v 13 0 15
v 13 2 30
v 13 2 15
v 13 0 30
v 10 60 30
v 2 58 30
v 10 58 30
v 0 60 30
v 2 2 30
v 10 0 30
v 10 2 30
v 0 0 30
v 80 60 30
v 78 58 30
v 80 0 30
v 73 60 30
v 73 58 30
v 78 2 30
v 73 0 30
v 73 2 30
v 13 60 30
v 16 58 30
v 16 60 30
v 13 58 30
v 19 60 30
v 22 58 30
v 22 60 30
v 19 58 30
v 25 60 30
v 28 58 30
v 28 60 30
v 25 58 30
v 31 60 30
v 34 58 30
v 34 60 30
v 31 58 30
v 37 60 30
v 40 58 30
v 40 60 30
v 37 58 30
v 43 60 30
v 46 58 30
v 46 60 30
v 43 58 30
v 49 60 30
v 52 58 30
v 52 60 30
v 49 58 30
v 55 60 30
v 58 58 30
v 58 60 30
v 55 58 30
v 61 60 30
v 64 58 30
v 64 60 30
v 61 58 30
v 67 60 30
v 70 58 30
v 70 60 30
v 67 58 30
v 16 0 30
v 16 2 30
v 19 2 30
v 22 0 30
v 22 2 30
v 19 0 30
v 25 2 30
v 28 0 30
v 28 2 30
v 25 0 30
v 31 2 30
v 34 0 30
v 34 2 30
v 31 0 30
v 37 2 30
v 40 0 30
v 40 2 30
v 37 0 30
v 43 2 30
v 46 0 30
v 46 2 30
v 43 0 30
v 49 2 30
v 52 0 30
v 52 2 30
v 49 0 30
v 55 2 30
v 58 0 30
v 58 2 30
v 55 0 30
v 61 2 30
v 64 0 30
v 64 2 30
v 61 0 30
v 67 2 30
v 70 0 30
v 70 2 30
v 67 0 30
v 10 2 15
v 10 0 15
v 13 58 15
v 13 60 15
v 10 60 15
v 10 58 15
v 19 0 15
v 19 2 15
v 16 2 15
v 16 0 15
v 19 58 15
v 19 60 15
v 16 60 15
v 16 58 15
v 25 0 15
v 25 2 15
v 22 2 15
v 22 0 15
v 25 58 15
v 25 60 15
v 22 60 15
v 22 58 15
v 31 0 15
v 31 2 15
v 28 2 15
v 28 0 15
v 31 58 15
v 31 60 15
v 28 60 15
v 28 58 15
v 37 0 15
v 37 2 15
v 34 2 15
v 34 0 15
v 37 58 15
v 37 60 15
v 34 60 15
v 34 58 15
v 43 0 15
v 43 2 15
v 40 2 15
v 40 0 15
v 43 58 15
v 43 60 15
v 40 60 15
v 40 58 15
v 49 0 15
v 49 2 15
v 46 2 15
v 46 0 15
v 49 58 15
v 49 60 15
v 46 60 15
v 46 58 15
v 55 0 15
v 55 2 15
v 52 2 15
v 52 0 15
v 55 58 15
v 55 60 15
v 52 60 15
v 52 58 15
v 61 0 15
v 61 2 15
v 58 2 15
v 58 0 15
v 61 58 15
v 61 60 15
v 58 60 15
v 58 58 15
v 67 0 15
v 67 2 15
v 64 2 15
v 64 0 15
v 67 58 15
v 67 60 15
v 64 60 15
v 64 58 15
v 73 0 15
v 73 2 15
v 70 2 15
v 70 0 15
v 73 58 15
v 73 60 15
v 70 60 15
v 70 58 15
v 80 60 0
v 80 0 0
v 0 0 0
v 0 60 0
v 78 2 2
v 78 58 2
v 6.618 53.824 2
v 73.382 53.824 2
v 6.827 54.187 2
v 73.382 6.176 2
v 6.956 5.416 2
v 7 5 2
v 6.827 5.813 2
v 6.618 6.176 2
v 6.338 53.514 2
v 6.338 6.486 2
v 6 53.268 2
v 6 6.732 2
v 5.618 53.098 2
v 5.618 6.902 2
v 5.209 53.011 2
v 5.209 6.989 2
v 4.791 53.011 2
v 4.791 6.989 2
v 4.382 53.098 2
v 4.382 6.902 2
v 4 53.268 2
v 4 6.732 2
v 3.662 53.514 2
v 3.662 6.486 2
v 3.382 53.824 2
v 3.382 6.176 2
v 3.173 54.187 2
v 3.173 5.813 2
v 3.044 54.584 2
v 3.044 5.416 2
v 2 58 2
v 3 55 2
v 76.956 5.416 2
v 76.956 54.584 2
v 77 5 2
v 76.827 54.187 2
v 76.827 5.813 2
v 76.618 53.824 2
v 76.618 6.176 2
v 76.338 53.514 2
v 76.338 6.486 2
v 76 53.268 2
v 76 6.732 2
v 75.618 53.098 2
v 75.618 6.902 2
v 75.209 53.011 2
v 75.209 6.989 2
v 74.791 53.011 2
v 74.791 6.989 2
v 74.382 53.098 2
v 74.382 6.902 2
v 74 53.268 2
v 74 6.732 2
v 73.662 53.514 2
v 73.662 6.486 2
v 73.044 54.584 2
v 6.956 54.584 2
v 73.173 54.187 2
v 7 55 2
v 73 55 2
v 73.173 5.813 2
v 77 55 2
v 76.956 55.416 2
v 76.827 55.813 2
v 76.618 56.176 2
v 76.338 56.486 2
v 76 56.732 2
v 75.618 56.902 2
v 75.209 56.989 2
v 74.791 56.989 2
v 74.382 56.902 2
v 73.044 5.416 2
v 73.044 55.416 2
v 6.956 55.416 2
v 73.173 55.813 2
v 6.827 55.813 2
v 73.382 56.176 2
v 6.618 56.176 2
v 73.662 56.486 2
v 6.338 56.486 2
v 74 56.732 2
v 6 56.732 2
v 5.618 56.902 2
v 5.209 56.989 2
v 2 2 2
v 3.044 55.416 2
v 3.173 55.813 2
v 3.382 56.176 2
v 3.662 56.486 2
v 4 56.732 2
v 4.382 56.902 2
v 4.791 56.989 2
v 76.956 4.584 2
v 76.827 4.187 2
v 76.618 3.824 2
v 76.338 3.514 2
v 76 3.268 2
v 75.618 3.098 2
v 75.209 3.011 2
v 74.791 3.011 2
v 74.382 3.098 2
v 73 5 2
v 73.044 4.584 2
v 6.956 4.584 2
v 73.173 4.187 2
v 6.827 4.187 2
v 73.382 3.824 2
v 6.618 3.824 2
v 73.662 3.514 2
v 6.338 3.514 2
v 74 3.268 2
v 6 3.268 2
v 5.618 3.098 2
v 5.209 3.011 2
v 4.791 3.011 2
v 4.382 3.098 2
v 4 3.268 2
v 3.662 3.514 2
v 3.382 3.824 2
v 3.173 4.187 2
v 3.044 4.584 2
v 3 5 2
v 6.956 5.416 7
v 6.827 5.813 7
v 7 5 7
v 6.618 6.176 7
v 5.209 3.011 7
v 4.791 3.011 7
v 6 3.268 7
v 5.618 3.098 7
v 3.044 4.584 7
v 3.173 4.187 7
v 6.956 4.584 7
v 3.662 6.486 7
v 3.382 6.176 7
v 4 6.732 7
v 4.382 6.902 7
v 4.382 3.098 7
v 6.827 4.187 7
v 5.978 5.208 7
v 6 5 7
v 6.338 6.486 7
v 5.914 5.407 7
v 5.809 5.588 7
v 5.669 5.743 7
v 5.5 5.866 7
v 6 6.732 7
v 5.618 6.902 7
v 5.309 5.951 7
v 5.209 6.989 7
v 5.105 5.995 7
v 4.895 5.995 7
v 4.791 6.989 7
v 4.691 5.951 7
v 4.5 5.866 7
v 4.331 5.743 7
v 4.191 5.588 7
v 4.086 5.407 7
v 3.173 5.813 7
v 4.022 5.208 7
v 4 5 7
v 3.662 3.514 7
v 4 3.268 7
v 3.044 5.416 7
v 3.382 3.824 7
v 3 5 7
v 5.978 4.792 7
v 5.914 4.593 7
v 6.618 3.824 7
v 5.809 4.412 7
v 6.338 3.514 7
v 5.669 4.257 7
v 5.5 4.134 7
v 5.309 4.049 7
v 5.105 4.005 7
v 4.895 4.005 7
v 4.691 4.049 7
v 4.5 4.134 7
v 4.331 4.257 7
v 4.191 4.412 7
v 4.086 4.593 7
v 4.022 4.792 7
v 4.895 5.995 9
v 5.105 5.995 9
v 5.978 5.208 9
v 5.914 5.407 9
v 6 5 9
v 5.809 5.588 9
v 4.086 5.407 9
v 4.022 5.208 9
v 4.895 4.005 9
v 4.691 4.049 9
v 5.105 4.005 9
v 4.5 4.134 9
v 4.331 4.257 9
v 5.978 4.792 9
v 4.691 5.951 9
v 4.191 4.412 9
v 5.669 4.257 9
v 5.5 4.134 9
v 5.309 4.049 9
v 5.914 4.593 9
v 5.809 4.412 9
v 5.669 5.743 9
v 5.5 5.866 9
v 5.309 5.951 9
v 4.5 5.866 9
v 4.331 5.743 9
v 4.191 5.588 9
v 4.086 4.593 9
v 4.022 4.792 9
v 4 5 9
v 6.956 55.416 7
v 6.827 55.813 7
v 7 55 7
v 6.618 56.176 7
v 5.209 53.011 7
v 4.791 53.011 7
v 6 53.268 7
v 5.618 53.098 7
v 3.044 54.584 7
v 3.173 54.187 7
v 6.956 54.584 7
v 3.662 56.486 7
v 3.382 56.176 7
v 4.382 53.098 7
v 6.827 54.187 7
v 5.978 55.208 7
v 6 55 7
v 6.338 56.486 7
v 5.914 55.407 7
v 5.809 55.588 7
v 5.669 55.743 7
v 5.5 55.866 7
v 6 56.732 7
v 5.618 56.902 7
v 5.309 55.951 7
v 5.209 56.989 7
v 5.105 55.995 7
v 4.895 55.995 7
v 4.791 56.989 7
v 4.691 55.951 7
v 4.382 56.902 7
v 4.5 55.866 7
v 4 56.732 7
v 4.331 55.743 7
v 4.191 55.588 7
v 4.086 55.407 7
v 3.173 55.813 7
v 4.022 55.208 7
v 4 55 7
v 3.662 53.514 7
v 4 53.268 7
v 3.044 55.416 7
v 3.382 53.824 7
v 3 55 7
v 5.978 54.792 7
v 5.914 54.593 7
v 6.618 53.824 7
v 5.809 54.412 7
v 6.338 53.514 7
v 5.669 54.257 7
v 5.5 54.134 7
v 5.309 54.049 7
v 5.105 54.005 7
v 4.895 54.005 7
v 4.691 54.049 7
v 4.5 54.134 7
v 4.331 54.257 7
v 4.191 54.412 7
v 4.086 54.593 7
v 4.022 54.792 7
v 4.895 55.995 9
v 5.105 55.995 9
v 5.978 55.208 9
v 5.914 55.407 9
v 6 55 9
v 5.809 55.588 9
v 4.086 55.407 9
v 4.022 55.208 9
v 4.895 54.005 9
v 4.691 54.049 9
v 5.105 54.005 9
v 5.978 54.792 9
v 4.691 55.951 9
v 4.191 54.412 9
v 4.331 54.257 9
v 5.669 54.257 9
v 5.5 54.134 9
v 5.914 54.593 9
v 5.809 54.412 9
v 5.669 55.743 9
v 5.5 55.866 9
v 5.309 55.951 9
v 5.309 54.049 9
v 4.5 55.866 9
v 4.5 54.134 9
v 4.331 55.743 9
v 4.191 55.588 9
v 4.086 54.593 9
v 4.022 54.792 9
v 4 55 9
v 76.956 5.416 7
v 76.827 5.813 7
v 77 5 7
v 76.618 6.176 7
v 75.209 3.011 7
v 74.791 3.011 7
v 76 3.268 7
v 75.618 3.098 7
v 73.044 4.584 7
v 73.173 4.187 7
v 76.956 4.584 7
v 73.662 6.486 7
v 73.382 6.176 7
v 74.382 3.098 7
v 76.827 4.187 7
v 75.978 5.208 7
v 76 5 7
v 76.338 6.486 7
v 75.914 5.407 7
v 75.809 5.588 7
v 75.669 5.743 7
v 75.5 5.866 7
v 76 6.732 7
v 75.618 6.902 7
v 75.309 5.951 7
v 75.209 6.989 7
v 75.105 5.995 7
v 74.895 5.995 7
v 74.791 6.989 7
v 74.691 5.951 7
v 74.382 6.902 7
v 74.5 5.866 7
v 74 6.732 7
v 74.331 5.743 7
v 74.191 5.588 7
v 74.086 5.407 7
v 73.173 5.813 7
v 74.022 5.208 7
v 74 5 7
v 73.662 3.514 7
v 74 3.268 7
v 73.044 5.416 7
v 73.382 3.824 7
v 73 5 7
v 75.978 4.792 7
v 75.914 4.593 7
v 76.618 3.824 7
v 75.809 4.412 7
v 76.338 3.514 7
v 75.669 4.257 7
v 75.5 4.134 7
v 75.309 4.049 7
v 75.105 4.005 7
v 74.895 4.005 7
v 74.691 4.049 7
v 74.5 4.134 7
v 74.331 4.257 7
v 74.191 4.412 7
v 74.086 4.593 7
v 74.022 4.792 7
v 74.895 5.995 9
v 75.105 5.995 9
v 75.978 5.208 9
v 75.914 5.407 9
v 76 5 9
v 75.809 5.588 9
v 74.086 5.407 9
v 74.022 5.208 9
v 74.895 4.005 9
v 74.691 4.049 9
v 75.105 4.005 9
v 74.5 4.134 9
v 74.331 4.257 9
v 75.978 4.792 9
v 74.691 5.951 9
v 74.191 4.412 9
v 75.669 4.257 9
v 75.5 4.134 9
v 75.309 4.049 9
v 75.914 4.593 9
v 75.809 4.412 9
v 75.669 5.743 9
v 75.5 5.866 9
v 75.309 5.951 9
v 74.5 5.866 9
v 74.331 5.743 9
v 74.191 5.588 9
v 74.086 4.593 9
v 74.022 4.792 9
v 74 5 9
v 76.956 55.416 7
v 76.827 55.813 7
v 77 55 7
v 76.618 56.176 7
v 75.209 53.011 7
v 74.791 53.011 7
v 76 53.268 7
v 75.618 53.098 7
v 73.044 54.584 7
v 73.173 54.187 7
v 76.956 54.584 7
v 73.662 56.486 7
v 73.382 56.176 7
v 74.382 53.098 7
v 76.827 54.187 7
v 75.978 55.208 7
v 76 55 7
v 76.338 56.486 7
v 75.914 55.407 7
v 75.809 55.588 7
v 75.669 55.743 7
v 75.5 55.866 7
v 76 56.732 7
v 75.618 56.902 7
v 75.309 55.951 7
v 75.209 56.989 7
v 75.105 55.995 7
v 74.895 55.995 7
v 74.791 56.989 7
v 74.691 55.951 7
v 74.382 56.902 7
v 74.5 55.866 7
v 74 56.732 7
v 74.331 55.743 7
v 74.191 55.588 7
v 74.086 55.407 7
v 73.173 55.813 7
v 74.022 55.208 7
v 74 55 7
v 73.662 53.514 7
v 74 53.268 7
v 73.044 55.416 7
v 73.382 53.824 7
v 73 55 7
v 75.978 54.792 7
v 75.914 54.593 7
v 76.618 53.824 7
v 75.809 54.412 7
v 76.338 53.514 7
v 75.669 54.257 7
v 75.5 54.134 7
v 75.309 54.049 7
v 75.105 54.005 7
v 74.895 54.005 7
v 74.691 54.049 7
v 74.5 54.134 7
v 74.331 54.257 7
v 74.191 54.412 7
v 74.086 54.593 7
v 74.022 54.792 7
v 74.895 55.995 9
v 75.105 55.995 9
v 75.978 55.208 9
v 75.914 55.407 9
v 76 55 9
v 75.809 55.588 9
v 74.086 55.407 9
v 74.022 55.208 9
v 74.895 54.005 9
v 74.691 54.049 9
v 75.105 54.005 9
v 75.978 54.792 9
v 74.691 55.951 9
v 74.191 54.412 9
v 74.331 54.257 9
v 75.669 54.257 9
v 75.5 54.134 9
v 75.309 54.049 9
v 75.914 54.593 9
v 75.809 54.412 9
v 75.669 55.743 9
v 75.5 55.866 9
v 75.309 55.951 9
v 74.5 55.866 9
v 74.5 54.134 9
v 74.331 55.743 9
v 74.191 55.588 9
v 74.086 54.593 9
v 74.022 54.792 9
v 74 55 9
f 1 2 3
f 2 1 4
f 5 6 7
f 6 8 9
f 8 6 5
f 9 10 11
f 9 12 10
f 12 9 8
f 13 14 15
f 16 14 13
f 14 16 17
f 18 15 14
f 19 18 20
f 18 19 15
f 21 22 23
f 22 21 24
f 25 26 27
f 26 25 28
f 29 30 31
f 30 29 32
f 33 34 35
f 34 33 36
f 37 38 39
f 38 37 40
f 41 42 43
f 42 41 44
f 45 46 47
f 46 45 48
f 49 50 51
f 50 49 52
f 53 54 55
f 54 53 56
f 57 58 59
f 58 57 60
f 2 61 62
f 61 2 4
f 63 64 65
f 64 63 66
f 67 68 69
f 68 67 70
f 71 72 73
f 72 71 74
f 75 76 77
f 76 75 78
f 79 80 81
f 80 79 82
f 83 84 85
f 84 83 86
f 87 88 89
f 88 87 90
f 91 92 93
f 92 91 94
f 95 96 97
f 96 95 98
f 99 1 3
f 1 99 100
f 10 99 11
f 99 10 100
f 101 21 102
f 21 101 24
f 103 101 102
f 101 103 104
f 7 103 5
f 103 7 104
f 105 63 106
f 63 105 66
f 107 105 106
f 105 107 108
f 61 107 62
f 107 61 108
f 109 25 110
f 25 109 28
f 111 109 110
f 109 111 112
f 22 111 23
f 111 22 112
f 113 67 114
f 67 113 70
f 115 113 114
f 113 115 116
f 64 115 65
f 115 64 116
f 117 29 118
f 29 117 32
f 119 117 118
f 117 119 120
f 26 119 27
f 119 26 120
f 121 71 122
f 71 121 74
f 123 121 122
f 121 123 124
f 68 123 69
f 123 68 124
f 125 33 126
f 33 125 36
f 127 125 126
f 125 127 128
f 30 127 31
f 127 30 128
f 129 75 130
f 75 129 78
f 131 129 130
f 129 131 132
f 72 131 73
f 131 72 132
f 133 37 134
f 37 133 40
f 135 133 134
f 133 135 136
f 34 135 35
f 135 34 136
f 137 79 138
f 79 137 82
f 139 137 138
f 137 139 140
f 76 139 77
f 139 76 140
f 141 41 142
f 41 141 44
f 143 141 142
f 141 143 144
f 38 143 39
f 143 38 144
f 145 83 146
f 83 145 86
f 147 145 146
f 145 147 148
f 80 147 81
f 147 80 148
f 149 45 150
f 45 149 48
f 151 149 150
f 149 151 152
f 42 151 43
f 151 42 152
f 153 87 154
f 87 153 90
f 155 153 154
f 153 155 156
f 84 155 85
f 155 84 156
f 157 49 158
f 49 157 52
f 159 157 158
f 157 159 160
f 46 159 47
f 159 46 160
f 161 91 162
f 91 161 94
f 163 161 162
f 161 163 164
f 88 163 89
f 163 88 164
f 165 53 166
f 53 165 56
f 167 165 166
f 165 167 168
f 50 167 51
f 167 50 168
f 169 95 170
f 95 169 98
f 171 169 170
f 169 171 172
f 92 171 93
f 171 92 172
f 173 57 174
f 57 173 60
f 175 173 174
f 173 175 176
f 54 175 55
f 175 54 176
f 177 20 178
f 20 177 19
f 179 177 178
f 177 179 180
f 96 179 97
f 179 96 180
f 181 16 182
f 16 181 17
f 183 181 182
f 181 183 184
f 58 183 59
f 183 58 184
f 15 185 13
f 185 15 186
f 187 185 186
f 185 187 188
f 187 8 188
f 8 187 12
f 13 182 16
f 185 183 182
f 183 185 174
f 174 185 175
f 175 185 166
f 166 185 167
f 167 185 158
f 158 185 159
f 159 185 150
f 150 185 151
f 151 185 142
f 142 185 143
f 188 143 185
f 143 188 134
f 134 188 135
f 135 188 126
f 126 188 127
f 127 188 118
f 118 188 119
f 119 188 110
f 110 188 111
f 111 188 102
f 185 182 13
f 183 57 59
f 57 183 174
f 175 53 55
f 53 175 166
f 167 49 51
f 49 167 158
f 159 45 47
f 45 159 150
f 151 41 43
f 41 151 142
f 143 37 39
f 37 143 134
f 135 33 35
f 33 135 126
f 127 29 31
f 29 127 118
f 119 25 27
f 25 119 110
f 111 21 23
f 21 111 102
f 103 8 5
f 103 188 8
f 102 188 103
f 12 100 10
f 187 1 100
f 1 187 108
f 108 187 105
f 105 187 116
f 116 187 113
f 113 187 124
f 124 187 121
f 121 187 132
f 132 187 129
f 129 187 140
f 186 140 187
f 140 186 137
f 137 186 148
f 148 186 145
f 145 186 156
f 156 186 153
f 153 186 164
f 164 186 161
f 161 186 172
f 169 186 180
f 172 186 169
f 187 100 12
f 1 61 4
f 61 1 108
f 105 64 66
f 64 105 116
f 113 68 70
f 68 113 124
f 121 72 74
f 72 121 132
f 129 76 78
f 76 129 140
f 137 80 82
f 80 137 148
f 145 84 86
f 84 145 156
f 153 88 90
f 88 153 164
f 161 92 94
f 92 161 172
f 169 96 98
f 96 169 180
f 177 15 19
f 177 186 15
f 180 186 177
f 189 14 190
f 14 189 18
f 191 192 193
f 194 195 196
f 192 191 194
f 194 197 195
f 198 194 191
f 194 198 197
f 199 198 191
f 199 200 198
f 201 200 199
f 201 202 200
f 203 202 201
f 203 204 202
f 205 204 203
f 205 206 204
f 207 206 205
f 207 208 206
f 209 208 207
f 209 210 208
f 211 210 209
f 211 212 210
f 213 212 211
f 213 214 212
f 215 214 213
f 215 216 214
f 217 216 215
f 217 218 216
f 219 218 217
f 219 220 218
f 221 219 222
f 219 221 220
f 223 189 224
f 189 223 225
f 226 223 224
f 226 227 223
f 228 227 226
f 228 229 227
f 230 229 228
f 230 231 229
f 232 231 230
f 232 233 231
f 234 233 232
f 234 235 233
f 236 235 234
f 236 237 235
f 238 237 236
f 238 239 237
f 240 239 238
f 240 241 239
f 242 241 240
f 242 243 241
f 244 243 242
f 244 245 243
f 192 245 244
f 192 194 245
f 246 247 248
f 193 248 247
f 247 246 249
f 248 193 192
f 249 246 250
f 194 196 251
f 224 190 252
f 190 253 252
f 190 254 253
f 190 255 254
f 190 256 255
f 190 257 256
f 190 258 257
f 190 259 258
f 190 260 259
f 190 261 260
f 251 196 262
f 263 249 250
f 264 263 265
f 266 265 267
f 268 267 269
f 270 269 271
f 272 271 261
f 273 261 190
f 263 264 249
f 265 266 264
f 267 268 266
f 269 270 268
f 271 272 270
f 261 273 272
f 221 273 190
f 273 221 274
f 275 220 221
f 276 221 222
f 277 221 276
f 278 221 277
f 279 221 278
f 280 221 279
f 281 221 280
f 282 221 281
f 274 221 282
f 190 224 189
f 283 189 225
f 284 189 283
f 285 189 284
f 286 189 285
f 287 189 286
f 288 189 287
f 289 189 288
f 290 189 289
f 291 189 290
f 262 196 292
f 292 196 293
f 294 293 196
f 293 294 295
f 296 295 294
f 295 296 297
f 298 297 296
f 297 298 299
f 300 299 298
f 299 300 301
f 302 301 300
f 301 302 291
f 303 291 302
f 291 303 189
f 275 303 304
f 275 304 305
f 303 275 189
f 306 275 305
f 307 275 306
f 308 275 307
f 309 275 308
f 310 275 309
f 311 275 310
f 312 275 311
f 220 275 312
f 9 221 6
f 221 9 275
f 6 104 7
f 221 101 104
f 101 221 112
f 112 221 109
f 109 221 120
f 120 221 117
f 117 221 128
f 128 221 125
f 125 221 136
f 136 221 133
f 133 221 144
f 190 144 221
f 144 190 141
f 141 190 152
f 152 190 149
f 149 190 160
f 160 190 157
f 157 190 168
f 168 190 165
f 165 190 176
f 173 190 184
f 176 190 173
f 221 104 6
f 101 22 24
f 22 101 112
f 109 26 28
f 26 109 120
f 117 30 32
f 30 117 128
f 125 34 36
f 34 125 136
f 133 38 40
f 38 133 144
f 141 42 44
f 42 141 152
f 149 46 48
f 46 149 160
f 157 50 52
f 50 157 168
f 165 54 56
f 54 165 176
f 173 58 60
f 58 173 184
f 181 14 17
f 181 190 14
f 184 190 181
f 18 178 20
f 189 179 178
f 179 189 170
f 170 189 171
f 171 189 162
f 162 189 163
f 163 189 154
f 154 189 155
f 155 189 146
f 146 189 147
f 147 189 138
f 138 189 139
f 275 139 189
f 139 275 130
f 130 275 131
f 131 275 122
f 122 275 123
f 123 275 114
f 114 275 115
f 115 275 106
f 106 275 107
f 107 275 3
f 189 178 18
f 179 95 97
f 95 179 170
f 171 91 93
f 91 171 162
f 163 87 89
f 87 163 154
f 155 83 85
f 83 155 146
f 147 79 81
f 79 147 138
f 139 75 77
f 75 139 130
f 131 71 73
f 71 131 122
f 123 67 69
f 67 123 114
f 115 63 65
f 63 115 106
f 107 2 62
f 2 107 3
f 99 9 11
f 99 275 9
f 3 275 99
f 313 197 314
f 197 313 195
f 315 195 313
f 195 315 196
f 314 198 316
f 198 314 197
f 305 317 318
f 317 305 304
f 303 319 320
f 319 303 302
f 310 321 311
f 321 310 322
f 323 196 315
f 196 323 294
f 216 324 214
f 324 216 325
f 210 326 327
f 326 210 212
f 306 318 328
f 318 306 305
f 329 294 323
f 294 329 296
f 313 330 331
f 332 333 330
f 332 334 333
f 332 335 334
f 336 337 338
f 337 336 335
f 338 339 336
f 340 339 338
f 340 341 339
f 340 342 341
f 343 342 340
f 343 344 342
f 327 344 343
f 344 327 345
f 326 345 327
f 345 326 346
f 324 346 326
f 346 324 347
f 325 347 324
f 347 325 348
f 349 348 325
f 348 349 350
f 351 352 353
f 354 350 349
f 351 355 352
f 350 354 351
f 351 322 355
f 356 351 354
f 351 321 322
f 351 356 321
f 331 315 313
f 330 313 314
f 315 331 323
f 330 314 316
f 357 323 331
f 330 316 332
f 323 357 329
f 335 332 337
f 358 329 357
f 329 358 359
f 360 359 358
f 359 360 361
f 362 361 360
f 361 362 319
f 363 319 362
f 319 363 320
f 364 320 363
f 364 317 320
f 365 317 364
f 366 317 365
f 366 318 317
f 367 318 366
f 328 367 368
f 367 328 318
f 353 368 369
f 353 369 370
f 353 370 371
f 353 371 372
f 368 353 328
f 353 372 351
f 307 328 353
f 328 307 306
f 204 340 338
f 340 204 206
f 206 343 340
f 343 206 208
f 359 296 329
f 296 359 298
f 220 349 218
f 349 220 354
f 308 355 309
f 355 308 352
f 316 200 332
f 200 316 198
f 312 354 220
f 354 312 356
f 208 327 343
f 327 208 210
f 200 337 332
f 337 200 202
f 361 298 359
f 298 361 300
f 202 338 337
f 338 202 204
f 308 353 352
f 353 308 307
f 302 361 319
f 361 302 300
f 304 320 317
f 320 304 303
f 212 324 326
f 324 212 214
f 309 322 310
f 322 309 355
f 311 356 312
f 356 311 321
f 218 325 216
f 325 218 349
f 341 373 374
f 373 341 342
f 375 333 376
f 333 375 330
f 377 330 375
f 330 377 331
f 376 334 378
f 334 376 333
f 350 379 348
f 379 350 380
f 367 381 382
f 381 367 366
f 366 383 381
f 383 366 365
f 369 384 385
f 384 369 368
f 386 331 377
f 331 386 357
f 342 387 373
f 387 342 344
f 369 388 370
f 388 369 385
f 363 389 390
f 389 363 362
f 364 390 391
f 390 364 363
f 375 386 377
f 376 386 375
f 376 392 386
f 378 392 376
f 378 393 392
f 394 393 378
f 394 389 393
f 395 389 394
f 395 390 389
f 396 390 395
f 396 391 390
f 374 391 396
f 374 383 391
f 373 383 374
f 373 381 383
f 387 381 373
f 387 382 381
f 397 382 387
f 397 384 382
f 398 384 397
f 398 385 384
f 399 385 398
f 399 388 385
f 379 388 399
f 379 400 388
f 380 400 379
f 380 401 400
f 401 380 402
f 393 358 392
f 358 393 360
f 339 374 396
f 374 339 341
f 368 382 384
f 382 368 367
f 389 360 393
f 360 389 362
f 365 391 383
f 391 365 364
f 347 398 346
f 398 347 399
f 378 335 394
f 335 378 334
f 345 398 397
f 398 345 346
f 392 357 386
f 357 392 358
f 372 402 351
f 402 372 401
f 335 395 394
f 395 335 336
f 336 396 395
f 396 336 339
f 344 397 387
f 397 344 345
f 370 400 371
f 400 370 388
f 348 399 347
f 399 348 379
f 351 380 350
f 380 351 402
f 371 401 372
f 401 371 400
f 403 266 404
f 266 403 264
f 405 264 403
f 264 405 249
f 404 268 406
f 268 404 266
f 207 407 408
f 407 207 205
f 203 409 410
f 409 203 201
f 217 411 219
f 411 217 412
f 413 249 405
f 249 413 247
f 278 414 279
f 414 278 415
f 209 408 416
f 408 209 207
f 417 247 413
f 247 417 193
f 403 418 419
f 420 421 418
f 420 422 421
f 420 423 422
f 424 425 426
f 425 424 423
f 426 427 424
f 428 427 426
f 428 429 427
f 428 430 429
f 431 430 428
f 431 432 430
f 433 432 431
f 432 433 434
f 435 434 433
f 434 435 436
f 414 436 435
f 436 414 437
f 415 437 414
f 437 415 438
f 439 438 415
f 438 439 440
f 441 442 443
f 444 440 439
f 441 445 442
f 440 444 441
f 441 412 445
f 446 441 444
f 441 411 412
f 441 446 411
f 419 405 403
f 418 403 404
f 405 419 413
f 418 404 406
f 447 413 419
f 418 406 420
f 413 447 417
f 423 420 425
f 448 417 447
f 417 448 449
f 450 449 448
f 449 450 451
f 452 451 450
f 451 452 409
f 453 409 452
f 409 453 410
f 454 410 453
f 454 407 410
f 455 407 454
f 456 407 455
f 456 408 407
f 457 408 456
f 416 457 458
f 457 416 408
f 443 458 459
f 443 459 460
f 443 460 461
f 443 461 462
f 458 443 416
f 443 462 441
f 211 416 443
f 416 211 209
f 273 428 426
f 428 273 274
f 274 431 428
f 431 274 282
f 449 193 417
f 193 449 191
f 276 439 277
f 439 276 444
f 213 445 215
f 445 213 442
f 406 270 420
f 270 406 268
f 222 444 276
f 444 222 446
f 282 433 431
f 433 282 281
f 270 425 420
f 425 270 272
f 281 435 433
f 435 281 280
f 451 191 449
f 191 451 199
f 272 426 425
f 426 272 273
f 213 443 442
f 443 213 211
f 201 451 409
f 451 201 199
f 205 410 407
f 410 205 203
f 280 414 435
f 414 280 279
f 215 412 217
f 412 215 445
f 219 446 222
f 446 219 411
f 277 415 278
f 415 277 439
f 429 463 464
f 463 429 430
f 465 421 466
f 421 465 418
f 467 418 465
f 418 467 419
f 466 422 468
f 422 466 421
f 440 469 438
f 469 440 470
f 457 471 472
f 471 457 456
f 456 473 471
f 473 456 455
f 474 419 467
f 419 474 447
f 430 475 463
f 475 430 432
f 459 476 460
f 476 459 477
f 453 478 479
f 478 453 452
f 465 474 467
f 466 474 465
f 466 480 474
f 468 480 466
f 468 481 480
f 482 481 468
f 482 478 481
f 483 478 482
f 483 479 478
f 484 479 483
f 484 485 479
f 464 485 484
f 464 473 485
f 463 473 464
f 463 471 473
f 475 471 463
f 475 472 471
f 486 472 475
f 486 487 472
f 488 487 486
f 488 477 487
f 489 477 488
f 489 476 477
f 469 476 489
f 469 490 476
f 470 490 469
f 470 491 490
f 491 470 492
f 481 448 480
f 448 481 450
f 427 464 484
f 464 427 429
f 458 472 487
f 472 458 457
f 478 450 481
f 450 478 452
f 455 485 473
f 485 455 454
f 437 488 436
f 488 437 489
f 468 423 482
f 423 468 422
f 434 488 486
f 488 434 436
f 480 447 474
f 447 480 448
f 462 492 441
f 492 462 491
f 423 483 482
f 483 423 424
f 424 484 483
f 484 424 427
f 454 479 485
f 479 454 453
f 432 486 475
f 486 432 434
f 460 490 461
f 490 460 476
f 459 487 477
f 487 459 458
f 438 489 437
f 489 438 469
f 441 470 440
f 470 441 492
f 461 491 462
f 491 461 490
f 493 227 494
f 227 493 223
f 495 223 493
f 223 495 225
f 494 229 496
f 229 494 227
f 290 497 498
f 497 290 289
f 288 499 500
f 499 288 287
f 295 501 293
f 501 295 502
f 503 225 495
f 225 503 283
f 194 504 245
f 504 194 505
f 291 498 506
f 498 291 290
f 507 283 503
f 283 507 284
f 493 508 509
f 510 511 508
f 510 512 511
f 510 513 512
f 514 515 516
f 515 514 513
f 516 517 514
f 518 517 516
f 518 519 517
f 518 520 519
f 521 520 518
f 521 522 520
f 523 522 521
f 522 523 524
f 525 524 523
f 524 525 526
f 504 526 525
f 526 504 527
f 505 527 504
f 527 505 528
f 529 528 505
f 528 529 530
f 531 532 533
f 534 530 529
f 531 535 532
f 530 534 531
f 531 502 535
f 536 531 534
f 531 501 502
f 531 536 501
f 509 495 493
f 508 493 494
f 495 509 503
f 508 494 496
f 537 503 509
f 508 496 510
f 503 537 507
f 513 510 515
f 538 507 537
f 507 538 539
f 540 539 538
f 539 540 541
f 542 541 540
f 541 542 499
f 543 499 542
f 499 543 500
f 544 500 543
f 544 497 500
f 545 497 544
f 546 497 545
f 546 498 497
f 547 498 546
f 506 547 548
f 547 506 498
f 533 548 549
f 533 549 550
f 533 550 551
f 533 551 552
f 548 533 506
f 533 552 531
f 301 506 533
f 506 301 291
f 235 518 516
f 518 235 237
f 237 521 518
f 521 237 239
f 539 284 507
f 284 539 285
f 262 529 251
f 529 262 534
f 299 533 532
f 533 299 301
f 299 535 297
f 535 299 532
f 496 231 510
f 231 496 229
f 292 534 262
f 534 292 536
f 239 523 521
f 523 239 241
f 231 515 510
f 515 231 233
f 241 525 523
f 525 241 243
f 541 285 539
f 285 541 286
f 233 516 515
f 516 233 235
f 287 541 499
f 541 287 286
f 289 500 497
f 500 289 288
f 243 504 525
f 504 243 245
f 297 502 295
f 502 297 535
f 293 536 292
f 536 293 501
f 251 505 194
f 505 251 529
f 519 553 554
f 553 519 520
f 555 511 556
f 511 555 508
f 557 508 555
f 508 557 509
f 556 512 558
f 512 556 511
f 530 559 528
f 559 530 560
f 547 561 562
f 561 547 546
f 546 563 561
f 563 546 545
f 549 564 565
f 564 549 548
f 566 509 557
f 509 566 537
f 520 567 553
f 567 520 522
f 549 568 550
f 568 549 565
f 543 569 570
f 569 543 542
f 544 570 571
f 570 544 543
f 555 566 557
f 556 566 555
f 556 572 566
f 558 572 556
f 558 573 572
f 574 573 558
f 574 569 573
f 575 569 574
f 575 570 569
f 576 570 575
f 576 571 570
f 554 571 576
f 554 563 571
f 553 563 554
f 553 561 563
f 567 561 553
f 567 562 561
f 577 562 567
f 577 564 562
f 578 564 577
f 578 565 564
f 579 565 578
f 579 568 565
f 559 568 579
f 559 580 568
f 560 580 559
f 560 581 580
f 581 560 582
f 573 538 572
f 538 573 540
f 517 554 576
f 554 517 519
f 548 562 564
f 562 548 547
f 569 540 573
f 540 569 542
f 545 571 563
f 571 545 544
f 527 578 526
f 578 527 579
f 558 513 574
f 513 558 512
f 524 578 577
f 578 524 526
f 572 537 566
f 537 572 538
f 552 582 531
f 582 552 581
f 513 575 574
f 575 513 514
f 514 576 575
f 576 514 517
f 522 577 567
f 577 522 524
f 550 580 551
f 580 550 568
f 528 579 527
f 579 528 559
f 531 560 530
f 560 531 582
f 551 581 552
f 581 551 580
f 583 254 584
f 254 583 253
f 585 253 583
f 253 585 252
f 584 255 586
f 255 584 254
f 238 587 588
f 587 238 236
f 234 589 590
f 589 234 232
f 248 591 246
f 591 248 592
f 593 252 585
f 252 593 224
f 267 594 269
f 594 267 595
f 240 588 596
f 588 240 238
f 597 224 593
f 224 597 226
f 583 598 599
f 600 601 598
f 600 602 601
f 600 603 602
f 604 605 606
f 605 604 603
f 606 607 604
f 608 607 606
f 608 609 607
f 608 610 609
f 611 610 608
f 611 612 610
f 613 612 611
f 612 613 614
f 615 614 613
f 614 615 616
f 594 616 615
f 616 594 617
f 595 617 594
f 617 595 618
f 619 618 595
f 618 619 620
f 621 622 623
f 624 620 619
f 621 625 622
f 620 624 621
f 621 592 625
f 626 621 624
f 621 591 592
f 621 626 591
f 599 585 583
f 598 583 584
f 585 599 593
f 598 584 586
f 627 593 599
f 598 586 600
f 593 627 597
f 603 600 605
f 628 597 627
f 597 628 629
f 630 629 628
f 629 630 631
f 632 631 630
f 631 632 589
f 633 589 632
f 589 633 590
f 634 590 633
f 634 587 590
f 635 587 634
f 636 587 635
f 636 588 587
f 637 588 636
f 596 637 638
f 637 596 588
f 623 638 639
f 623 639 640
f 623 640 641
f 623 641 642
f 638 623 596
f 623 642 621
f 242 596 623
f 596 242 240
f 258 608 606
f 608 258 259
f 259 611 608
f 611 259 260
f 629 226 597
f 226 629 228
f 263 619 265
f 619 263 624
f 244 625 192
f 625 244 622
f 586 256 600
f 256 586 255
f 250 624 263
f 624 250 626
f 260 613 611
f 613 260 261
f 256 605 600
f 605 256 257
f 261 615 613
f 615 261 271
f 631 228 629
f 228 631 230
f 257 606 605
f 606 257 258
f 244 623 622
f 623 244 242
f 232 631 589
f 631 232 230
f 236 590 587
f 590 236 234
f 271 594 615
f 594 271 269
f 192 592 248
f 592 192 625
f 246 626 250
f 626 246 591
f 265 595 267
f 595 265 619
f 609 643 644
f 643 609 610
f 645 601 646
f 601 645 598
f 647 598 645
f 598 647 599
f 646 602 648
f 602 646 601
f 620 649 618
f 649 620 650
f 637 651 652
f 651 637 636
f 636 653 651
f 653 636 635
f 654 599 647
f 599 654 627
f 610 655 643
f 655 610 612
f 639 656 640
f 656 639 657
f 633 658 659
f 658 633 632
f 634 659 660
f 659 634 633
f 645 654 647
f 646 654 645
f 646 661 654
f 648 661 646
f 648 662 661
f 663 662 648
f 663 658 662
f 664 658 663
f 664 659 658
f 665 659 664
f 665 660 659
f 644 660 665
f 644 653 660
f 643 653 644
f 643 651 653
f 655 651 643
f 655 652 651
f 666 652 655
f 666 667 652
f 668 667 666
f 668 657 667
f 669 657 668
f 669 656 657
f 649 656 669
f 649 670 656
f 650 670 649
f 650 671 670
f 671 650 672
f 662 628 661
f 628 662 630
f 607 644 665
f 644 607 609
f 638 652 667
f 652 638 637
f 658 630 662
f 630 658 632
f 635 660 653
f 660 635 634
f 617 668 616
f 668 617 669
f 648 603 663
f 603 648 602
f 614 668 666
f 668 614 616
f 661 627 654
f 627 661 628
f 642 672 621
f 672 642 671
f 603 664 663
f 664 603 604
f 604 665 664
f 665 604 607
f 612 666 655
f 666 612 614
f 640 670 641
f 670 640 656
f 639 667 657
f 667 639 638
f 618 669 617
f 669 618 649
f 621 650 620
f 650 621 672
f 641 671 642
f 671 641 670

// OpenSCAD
// Vented Electronics Enclosure
// A box with a snap-fit lid and ventilation slots

$fn = 30;

width = 80;
depth = 60;
height = 30;
wall_thickness = 2;
vent_width = 3;
vent_spacing = 6;

module main() {
    // Base Box
    difference() {
        // Outer shell
        cube([width, depth, height]);
        
        // Inner hollow
        translate([wall_thickness, wall_thickness, wall_thickness])
            cube([width - wall_thickness*2, depth - wall_thickness*2, height]);
            
        // Ventilation slots on the sides
        for (x = [10 : vent_spacing : width - 10]) {
            translate([x, -1, height/2])
                cube([vent_width, wall_thickness + 2, height/2]);
            translate([x, depth - wall_thickness - 1, height/2])
                cube([vent_width, wall_thickness + 2, height/2]);
        }
    }
    
    // Mounting posts (standoffs) in corners
    post_offset = 5;
    post_height = 5;
    for (x = [post_offset, width - post_offset]) {
        for (y = [post_offset, depth - post_offset]) {
            translate([x, y, wall_thickness])
                cylinder(h = post_height, d = 4);
            translate([x, y, wall_thickness + post_height])
                cylinder(h = 2, d = 2); // Screw hole marker
        }
    }
}

main();
